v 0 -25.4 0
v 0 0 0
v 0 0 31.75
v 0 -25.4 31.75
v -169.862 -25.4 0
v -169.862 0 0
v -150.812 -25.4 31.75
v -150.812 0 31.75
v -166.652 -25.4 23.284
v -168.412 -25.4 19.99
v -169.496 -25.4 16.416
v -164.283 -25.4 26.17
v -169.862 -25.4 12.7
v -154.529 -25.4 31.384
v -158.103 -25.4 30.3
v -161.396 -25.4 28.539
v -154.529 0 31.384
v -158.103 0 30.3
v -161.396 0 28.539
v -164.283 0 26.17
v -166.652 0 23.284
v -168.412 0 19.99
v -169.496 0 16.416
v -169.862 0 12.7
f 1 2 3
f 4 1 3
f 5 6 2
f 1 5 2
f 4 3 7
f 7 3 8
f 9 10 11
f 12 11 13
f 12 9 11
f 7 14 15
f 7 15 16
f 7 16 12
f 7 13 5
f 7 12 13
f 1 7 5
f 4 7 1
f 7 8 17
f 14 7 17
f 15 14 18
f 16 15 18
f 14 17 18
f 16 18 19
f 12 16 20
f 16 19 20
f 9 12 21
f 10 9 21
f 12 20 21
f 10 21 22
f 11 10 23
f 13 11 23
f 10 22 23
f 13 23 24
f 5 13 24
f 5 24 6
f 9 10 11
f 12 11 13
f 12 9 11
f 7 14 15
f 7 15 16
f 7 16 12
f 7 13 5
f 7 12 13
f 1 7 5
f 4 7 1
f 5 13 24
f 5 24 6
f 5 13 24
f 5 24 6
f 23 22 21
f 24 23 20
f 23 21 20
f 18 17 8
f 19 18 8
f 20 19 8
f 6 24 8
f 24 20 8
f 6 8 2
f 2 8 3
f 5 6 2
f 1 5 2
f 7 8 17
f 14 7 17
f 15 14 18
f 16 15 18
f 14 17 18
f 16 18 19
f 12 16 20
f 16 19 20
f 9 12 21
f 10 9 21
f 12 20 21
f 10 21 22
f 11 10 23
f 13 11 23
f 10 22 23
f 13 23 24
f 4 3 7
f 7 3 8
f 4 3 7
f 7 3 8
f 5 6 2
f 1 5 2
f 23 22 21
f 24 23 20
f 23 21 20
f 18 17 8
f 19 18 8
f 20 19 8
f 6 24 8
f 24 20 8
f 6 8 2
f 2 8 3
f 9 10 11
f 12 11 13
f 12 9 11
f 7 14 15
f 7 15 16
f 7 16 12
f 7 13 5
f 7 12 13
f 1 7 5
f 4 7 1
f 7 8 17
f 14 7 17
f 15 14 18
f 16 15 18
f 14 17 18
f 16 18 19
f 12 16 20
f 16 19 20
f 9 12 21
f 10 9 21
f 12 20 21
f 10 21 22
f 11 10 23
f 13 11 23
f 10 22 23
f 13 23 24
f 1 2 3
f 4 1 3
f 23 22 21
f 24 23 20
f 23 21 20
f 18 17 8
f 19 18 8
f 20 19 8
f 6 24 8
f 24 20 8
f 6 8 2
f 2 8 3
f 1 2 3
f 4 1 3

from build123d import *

# Parameters (mm, degrees)
F1_DEPTH = 25.4
F2_DEPTH = 25.4
F3_DEPTH = 25.4


with BuildPart() as f1:
    # F0 (on Front) → F1 (new body)
    with BuildSketch(Plane.XZ):
        with BuildLine():
            Line((-68.262484, 0), (0, 0))
            Line((0, 0), (0, 31.75))
            Line((0, 31.75), (-150.812484, 31.75))
            ThreePointArc((-150.812484, 31.75), (-164.282868, 26.170384), (-169.862484, 12.7))
            Line((-169.862484, 12.7), (-169.862484, 0))
            Line((-169.862484, 0), (-87.312484, 0))
            Line((-87.312484, 0), (-68.262484, 0))
        make_face()
    extrude(amount=F1_DEPTH)


with BuildPart() as f2:
    # F0 (on Front) → F2 (new body)
    with BuildSketch(Plane.XZ):
        with BuildLine():
            Line((-68.262484, 0), (0, 0))
            Line((0, 0), (0, 31.75))
            Line((0, 31.75), (-150.812484, 31.75))
            ThreePointArc((-150.812484, 31.75), (-164.282868, 26.170384), (-169.862484, 12.7))
            Line((-169.862484, 12.7), (-169.862484, 0))
            Line((-169.862484, 0), (-87.312484, 0))
            Line((-87.312484, 0), (-68.262484, 0))
        make_face()
    extrude(amount=F2_DEPTH)


with BuildPart() as f3:
    # F0 (on Front) → F3 (new body)
    with BuildSketch(Plane.XZ):
        with BuildLine():
            Line((-68.262484, 0), (0, 0))
            Line((0, 0), (0, 31.75))
            Line((0, 31.75), (-150.812484, 31.75))
            ThreePointArc((-150.812484, 31.75), (-164.282868, 26.170384), (-169.862484, 12.7))
            Line((-169.862484, 12.7), (-169.862484, 0))
            Line((-169.862484, 0), (-87.312484, 0))
            Line((-87.312484, 0), (-68.262484, 0))
        make_face()
    extrude(amount=F3_DEPTH)


solid = Compound([f1.part, f2.part, f3.part])
